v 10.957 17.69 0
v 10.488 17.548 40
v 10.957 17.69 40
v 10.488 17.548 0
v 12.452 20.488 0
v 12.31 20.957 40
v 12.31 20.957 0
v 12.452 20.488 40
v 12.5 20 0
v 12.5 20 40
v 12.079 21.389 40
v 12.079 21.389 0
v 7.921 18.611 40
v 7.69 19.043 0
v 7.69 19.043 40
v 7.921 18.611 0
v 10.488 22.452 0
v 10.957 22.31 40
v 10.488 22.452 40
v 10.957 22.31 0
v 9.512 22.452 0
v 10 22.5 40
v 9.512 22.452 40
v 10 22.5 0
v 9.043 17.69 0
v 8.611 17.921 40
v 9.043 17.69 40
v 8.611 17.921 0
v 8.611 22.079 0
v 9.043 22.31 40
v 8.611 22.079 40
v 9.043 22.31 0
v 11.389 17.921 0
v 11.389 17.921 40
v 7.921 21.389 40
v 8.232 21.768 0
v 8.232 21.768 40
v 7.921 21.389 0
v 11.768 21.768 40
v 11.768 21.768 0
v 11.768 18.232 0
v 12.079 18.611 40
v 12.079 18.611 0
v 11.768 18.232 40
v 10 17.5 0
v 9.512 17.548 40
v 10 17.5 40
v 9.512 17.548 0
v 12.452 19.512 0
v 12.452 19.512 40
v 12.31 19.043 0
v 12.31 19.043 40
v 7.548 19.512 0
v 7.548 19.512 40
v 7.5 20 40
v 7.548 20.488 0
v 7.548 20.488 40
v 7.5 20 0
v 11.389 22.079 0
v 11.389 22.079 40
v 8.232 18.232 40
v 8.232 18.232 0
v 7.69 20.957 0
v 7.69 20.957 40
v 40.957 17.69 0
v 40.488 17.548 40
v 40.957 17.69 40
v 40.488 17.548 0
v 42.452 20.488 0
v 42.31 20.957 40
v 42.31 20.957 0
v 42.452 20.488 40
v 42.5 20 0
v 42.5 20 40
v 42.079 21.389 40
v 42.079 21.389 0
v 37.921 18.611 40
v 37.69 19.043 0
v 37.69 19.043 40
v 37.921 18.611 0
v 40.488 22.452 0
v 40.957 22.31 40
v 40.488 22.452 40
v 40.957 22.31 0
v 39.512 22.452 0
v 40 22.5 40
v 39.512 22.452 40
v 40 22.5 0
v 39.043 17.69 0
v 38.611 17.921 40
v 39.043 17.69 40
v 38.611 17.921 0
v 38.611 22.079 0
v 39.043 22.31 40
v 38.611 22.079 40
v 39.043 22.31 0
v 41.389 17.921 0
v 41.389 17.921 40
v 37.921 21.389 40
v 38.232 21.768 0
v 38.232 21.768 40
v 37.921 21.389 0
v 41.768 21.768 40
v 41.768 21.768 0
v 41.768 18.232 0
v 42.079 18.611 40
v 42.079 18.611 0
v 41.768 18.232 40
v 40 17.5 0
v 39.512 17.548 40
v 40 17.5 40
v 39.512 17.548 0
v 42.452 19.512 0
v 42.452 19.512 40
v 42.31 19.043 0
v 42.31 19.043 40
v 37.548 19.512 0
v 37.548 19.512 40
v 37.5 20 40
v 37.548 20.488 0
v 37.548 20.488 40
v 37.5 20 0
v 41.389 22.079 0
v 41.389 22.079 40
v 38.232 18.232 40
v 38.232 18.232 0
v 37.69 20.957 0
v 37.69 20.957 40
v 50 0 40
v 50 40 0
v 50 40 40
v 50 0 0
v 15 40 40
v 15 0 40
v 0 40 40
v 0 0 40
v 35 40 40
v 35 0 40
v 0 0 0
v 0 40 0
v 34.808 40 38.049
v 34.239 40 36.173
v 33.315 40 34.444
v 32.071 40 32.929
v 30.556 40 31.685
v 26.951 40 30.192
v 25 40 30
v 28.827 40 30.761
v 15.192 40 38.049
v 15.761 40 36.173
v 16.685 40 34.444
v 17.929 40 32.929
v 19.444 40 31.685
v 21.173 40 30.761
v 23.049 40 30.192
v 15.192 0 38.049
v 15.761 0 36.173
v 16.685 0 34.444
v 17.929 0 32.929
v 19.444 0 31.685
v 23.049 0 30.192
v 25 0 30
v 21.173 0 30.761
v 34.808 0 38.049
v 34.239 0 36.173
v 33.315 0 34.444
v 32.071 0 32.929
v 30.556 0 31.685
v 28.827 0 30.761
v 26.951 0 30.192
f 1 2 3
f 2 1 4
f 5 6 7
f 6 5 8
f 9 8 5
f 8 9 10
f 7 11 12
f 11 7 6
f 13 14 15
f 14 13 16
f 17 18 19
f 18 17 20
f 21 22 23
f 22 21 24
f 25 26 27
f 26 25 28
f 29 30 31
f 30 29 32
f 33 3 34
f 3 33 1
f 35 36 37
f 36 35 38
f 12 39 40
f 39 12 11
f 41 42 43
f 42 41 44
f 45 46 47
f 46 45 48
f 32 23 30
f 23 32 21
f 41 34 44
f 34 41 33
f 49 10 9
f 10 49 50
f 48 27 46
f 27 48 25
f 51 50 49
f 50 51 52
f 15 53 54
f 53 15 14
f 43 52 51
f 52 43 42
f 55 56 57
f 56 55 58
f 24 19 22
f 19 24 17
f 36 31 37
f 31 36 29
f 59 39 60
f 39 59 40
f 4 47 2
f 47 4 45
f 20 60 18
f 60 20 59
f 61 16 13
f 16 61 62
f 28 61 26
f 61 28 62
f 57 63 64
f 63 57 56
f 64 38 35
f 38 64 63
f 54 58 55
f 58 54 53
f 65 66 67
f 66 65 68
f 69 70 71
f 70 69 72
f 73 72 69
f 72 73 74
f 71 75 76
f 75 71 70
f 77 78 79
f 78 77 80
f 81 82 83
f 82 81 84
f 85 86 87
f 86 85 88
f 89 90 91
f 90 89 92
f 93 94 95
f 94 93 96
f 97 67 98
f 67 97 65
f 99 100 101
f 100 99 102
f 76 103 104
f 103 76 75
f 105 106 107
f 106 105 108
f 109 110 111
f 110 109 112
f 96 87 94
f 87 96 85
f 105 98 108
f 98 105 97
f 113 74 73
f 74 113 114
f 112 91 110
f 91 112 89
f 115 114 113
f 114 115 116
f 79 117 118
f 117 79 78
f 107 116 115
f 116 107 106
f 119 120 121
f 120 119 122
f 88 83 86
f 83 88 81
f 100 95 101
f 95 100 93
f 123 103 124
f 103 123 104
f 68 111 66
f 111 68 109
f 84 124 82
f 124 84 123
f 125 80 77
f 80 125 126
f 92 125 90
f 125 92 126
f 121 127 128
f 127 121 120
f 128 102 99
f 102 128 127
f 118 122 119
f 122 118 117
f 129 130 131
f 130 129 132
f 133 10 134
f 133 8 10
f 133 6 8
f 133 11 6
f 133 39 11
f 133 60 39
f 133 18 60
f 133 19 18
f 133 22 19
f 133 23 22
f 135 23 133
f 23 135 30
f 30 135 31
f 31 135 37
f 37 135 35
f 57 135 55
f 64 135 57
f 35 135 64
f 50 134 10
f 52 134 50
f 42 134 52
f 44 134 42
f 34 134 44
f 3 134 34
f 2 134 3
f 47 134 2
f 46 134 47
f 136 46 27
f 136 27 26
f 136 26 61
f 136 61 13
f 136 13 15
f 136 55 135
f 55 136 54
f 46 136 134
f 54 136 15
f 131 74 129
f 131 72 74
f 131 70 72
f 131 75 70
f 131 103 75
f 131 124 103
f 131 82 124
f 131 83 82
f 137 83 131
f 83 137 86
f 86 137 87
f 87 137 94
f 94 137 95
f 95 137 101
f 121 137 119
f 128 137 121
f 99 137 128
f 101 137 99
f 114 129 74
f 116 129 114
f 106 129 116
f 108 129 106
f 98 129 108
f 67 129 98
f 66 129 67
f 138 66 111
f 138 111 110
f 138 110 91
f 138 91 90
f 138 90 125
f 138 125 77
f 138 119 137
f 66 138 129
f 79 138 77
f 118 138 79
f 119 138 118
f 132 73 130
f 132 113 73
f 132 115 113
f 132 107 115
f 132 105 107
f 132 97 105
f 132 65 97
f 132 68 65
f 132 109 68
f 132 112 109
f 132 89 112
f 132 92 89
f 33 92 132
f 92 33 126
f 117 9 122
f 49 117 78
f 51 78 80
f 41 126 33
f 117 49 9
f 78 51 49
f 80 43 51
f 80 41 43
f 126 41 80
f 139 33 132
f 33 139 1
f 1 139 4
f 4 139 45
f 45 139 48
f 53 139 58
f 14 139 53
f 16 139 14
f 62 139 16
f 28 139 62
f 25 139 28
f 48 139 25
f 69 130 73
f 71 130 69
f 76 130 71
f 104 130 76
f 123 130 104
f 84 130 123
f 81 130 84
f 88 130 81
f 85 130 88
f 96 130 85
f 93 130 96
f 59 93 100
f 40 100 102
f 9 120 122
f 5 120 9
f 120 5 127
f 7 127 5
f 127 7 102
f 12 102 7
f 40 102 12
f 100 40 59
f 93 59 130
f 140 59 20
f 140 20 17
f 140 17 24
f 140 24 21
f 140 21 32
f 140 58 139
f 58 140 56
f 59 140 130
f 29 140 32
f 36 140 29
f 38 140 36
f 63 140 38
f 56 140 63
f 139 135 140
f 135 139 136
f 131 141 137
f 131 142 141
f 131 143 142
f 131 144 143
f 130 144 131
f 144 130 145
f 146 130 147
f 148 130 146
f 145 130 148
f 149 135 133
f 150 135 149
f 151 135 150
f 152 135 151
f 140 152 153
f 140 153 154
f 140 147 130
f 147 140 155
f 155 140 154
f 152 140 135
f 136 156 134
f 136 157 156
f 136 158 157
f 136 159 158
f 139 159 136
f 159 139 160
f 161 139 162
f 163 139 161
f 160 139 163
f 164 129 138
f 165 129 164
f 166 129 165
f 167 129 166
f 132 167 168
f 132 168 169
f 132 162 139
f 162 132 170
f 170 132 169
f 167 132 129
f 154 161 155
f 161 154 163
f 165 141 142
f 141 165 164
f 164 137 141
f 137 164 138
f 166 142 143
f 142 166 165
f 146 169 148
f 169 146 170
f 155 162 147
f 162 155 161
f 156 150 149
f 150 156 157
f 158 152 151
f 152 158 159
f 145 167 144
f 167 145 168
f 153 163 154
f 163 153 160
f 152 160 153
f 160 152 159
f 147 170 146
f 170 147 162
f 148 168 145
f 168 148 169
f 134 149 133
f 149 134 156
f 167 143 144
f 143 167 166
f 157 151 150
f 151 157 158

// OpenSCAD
$fn = 32;

// ----------------------------------------------------------------------
// Saddle clamp: plain shaft clamp
// ----------------------------------------------------------------------

// --- parameters (mm) ---
blk_l = 50;               // block length, X
blk_w = 40;               // block width, Y
blk_h = 40;               // block height
clamp_r = 10;             // shaft groove radius
hole_r = 2.5;             // bolt hole radius
hole_m = 10;              // bolt hole margin from the ends

saw_depth = clamp_r + 3;  // saw kerf depth

difference() {
  cube([blk_l, blk_w, blk_h]);
  translate([blk_l / 2, -1, blk_h])
    rotate([-90, 0, 0])
      cylinder(h = blk_w + 2, r = clamp_r);
  for (sx = [0, 1])
    translate([sx ? blk_l - hole_m : hole_m, blk_w / 2, -1])
      cylinder(r = hole_r, h = blk_h + 2);
}
